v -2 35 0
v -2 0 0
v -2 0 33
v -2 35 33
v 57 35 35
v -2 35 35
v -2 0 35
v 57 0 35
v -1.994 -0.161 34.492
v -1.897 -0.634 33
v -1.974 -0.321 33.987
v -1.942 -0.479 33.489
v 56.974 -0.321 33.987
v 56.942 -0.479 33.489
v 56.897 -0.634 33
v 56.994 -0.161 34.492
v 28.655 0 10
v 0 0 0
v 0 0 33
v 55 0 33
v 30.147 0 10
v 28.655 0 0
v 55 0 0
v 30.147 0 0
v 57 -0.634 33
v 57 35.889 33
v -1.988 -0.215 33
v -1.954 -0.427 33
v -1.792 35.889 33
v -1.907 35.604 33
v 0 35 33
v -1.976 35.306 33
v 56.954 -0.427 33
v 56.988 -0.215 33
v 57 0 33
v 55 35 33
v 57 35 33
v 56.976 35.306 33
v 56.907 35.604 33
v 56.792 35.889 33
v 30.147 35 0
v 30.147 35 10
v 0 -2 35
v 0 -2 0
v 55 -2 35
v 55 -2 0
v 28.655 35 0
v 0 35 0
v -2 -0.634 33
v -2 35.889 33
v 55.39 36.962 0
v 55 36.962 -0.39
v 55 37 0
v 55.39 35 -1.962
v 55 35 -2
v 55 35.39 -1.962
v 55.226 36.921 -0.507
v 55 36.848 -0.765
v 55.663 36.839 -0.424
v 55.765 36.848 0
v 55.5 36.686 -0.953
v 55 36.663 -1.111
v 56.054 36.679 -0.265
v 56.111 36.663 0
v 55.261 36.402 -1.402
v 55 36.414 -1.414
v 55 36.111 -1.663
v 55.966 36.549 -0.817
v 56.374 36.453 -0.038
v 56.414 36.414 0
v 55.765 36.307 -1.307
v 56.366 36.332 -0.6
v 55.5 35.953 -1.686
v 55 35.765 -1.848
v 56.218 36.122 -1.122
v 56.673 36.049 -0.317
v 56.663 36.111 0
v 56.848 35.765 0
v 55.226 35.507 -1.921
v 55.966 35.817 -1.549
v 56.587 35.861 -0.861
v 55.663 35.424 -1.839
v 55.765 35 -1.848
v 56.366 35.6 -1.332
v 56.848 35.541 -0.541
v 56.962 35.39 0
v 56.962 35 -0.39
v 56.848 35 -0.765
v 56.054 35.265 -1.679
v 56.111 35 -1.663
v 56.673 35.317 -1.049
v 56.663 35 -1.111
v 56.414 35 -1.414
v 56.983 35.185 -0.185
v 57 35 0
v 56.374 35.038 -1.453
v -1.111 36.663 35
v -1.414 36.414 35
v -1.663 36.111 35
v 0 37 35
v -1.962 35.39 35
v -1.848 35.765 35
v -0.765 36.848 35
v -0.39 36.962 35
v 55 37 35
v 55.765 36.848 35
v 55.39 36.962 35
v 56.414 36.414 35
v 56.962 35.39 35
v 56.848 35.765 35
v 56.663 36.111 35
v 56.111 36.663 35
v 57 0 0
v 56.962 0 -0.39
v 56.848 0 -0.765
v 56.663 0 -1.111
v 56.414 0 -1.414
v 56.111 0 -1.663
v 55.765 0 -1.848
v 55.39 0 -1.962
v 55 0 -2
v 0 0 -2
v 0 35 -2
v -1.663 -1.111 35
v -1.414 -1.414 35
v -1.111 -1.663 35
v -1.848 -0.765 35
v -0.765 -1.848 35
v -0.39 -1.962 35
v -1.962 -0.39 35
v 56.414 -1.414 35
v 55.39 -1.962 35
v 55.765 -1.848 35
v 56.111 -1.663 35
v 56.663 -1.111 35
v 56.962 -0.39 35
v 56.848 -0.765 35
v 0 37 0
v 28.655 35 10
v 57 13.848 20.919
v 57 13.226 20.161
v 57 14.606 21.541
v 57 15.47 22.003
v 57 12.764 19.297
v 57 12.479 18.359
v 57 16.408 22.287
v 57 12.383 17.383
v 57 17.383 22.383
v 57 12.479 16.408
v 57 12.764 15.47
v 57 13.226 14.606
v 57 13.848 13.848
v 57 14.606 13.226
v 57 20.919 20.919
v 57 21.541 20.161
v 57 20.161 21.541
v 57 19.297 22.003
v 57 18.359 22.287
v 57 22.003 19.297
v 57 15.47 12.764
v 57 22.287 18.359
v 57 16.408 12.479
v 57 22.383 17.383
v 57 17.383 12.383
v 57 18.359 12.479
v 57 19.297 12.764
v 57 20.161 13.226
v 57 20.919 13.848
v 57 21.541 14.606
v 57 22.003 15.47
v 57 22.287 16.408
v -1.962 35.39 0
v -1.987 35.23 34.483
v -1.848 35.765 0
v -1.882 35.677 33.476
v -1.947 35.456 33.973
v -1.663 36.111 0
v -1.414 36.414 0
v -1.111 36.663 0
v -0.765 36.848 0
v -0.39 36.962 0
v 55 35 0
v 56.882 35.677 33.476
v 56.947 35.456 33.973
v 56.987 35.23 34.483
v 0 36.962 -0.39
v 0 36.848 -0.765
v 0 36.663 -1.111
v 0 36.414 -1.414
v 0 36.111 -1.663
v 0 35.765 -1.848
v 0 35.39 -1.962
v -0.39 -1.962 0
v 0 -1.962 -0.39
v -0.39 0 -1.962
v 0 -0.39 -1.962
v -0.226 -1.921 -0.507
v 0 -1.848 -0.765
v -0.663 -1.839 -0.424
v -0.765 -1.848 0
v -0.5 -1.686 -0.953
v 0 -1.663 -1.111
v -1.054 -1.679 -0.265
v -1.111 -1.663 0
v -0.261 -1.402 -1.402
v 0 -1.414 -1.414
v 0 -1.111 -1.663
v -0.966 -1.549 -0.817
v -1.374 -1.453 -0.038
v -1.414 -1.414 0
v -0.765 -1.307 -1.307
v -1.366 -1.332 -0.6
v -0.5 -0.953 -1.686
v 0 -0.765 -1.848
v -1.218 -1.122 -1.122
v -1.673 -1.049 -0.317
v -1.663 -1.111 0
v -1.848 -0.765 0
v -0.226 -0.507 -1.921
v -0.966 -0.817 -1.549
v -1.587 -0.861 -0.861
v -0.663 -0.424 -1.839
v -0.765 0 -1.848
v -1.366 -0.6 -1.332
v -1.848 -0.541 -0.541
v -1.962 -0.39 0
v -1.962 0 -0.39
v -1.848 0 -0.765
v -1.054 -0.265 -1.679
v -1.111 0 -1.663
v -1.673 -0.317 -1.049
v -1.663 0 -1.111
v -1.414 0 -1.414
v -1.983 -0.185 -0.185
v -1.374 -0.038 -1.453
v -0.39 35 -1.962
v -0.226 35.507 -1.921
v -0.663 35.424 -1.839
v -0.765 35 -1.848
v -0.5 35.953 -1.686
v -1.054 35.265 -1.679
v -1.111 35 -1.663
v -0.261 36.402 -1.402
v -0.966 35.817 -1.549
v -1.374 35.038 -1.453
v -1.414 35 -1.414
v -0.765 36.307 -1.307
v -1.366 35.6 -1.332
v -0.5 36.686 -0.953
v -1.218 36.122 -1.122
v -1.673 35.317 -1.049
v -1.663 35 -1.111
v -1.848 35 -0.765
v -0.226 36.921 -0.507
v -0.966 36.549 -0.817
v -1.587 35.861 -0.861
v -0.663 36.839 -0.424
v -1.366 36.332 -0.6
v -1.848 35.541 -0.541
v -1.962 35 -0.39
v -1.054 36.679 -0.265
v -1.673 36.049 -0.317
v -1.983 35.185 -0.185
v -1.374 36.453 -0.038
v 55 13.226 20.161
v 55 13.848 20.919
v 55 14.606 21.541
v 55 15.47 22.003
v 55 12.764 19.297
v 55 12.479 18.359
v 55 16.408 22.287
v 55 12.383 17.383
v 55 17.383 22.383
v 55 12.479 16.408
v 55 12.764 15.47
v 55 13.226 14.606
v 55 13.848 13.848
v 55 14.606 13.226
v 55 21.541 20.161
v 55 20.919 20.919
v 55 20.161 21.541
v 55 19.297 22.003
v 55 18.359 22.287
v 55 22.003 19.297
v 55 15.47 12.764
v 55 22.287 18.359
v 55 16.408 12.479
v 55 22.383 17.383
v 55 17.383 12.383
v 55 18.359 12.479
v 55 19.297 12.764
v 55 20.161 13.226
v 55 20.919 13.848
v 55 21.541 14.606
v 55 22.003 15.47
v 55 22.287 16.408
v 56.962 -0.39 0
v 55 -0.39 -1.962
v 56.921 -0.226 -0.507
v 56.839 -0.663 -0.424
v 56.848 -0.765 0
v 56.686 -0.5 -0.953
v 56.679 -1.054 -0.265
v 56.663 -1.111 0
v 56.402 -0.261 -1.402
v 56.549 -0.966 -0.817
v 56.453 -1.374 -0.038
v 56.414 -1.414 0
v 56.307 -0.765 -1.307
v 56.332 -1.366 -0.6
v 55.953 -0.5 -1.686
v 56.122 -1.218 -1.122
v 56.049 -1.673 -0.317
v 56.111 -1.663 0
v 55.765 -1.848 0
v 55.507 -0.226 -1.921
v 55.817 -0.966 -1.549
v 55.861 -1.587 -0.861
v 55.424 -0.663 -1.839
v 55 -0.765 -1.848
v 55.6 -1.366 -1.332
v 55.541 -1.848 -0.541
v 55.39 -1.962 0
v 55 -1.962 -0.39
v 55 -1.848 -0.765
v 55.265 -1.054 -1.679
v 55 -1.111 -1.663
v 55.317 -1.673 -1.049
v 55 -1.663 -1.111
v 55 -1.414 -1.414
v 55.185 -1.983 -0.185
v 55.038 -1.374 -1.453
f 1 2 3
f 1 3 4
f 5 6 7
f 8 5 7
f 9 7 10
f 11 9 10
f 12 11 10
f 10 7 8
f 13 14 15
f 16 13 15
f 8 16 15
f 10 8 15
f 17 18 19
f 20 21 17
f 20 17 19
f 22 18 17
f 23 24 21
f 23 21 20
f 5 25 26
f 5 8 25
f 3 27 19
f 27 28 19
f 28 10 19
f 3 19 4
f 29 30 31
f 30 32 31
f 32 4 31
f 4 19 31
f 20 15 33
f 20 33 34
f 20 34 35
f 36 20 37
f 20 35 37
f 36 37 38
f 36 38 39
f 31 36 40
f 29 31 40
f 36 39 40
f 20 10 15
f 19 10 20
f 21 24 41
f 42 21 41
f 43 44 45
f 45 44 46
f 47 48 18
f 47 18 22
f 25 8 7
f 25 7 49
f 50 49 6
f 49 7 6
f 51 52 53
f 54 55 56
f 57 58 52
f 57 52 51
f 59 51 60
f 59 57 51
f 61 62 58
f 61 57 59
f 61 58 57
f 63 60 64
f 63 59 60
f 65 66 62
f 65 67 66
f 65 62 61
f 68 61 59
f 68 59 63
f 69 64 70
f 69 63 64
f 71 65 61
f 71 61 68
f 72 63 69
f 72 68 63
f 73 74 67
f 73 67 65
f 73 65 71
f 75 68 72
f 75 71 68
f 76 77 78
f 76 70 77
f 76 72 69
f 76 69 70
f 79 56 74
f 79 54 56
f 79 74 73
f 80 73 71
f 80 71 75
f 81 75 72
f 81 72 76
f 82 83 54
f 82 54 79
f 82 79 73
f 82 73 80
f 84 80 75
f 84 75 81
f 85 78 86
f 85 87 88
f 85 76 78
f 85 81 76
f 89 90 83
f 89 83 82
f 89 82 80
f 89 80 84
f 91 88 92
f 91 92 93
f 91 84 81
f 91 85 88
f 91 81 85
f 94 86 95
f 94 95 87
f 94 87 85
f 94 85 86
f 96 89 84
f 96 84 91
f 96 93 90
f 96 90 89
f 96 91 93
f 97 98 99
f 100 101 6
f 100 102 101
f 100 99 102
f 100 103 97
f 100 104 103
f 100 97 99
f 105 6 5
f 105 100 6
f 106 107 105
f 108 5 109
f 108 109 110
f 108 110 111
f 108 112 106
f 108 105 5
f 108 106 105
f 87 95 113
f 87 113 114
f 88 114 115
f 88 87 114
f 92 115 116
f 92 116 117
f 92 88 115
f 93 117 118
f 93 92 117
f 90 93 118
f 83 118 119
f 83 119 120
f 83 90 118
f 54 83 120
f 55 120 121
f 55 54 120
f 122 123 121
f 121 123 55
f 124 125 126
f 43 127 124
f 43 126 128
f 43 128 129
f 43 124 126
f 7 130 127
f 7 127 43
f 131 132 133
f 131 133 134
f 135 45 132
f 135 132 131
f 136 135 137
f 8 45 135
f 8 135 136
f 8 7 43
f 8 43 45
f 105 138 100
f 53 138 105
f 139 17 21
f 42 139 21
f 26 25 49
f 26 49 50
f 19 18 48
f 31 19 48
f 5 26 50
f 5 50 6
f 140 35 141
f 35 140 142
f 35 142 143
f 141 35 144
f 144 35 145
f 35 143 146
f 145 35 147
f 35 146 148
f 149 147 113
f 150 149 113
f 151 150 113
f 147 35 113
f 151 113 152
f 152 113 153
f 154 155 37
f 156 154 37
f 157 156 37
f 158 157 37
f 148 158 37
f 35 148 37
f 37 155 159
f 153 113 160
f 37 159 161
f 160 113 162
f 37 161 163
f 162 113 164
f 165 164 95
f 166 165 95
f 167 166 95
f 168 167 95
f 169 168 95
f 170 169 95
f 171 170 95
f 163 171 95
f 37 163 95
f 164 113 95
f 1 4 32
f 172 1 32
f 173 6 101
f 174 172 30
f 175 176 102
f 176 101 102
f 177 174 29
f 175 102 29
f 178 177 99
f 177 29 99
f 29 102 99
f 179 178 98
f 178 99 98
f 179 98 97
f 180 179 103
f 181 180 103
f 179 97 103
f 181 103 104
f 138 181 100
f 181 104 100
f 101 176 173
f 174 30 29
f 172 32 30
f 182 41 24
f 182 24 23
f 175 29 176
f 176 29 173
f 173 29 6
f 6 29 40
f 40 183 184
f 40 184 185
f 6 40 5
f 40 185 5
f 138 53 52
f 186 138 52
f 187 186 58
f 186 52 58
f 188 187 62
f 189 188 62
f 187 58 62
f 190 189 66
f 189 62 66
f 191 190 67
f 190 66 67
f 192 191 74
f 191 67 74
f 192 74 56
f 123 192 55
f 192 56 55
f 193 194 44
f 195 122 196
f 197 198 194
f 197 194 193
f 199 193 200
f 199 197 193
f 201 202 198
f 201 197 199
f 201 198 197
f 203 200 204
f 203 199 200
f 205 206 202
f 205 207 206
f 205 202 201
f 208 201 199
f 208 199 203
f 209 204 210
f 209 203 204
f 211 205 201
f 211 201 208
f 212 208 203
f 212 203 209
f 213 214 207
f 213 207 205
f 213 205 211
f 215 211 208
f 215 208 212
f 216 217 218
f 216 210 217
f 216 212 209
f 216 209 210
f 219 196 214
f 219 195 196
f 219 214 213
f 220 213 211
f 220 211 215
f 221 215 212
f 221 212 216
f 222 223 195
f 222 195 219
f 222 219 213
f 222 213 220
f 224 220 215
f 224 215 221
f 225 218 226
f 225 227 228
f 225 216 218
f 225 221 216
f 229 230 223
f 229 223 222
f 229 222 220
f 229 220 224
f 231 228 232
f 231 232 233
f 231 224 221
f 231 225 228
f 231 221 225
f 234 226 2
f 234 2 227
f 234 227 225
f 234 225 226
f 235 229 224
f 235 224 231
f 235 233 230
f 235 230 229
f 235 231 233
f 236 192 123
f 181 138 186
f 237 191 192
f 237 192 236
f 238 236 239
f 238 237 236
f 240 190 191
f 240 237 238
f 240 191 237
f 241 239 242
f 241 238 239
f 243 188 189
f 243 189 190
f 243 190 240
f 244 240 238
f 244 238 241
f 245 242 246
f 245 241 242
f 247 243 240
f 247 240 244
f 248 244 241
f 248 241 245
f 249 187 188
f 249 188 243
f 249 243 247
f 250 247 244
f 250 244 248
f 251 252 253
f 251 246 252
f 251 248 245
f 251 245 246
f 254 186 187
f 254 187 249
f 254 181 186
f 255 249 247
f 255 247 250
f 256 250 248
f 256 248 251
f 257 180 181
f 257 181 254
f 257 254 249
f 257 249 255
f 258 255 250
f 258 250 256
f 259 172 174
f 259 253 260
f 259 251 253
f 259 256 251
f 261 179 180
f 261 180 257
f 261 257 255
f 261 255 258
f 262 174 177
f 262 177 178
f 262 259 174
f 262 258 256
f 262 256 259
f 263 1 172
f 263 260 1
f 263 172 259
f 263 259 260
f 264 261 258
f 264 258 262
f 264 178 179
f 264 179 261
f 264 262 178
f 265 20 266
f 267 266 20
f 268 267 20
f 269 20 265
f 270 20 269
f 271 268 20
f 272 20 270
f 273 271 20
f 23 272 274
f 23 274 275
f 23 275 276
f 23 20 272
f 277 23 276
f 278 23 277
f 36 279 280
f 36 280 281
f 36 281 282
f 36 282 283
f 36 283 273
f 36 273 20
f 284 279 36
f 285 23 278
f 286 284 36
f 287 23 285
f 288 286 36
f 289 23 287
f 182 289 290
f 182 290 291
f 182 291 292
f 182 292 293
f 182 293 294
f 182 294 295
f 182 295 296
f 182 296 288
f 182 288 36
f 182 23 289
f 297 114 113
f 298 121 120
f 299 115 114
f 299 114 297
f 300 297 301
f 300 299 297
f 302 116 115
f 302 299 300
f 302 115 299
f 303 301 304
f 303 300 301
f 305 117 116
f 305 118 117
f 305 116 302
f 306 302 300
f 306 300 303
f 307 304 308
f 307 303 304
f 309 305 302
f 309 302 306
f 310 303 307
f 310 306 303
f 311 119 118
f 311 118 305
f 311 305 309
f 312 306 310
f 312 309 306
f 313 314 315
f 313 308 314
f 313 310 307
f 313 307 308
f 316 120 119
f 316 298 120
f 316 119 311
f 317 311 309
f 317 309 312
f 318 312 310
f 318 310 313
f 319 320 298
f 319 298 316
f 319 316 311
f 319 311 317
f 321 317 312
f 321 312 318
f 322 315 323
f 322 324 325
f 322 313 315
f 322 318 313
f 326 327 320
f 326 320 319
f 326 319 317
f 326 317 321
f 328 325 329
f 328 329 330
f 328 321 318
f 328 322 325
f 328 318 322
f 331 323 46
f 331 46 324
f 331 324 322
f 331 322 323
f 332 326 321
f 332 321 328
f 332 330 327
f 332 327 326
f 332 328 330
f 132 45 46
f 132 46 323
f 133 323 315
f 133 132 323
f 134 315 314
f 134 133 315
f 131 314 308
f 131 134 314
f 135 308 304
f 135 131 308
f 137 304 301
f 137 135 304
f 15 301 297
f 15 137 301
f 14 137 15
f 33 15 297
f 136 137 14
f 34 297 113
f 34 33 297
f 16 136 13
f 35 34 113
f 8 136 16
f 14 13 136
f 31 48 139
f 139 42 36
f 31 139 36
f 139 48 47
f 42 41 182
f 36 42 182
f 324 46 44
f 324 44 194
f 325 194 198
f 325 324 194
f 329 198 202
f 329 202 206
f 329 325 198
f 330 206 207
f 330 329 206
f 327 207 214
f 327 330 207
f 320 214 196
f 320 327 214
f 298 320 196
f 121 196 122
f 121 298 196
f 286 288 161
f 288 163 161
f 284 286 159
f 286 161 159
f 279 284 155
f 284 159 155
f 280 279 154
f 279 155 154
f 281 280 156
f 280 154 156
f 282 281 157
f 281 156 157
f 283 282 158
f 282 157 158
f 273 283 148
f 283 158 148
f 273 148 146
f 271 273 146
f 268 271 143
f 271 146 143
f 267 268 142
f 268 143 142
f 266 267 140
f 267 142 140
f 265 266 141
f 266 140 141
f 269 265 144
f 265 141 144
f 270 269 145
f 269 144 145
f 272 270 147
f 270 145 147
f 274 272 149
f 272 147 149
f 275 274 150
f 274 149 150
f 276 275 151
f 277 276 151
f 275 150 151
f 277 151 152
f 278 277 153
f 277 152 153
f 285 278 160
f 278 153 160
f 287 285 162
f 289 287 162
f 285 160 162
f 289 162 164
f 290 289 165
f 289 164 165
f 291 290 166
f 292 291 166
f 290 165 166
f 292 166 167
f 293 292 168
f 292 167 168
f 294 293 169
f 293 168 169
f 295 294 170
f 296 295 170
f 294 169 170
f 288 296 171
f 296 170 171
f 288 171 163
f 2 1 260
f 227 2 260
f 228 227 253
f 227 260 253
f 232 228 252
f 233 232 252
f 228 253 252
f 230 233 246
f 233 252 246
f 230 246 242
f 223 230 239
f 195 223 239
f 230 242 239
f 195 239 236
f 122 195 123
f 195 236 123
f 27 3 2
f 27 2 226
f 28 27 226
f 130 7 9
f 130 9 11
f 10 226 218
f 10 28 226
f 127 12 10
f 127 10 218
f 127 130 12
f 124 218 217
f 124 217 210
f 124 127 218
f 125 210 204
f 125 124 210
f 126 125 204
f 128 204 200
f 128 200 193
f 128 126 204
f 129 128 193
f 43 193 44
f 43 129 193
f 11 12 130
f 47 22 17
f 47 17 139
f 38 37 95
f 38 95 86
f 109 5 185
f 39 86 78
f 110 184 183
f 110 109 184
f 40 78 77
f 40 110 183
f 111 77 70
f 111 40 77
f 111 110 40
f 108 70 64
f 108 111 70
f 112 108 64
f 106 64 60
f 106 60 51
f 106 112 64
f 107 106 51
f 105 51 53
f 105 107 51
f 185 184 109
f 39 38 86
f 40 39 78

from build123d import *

# Parameters (mm, degrees)
EXTRUDE002_DEPTH = 59
SKETCH001_R      = 5
EXTRUDE001_DEPTH = 2.25
SKETCH_W         = 1.491444
SKETCH_H         = 35
EXTRUDE_DEPTH    = 10
BOX_W            = 55
BOX_H            = 35
BOX_DEPTH        = 35
THICKNESS_T      = 2


with BuildPart() as extrude002:
    # Sketch002 (on Face18 of Cut) → Extrude002 (new body)
    with BuildSketch(Plane.YZ.offset(57)):
        Polygon((-0.633947, 33), (35.88865, 33), (35, 35), (0, 35), align=None)
    extrude(amount=-EXTRUDE002_DEPTH)


with BuildPart() as extrude001:
    # Sketch001 (on Face17 of Fusion) → Extrude001 (new body, symmetric)
    with BuildSketch(Plane.YZ.offset(57)):
        with Locations((17.383352, 17.383352)):
            Circle(SKETCH001_R)
    extrude(amount=EXTRUDE001_DEPTH, both=True)


with BuildPart() as extrude_body:
    # Sketch (on Face5 of Thickness) → Extrude (new body)
    with BuildSketch(Plane.XY):
        with Locations((29.400991, 17.5)):
            Rectangle(SKETCH_W, SKETCH_H)
    extrude(amount=EXTRUDE_DEPTH)


with BuildPart() as cut001:
    # Box → Box (new body)
    with BuildSketch(Plane.XY):
        with Locations((27.5, 17.5)):
            Rectangle(BOX_W, BOX_H)
    extrude(amount=BOX_DEPTH)

    # Thickness
    thickness_openings = [cut001.faces().sort_by_distance(p)[0] for p in [
        (27.5, 17.5, 35),
    ]]
    offset(amount=THICKNESS_T, openings=thickness_openings)

    # Fusion: union Extrude body
    add(extrude_body.part)

    # Cut: cut Extrude001
    add(extrude001.part, mode=Mode.SUBTRACT)

    # Cut001: cut Extrude002
    add(extrude002.part, mode=Mode.SUBTRACT)


with BuildPart() as cover:
    # Clone base: copy of Extrude002
    add(extrude002.part)


solid = Compound([cut001.part, cover.part])
